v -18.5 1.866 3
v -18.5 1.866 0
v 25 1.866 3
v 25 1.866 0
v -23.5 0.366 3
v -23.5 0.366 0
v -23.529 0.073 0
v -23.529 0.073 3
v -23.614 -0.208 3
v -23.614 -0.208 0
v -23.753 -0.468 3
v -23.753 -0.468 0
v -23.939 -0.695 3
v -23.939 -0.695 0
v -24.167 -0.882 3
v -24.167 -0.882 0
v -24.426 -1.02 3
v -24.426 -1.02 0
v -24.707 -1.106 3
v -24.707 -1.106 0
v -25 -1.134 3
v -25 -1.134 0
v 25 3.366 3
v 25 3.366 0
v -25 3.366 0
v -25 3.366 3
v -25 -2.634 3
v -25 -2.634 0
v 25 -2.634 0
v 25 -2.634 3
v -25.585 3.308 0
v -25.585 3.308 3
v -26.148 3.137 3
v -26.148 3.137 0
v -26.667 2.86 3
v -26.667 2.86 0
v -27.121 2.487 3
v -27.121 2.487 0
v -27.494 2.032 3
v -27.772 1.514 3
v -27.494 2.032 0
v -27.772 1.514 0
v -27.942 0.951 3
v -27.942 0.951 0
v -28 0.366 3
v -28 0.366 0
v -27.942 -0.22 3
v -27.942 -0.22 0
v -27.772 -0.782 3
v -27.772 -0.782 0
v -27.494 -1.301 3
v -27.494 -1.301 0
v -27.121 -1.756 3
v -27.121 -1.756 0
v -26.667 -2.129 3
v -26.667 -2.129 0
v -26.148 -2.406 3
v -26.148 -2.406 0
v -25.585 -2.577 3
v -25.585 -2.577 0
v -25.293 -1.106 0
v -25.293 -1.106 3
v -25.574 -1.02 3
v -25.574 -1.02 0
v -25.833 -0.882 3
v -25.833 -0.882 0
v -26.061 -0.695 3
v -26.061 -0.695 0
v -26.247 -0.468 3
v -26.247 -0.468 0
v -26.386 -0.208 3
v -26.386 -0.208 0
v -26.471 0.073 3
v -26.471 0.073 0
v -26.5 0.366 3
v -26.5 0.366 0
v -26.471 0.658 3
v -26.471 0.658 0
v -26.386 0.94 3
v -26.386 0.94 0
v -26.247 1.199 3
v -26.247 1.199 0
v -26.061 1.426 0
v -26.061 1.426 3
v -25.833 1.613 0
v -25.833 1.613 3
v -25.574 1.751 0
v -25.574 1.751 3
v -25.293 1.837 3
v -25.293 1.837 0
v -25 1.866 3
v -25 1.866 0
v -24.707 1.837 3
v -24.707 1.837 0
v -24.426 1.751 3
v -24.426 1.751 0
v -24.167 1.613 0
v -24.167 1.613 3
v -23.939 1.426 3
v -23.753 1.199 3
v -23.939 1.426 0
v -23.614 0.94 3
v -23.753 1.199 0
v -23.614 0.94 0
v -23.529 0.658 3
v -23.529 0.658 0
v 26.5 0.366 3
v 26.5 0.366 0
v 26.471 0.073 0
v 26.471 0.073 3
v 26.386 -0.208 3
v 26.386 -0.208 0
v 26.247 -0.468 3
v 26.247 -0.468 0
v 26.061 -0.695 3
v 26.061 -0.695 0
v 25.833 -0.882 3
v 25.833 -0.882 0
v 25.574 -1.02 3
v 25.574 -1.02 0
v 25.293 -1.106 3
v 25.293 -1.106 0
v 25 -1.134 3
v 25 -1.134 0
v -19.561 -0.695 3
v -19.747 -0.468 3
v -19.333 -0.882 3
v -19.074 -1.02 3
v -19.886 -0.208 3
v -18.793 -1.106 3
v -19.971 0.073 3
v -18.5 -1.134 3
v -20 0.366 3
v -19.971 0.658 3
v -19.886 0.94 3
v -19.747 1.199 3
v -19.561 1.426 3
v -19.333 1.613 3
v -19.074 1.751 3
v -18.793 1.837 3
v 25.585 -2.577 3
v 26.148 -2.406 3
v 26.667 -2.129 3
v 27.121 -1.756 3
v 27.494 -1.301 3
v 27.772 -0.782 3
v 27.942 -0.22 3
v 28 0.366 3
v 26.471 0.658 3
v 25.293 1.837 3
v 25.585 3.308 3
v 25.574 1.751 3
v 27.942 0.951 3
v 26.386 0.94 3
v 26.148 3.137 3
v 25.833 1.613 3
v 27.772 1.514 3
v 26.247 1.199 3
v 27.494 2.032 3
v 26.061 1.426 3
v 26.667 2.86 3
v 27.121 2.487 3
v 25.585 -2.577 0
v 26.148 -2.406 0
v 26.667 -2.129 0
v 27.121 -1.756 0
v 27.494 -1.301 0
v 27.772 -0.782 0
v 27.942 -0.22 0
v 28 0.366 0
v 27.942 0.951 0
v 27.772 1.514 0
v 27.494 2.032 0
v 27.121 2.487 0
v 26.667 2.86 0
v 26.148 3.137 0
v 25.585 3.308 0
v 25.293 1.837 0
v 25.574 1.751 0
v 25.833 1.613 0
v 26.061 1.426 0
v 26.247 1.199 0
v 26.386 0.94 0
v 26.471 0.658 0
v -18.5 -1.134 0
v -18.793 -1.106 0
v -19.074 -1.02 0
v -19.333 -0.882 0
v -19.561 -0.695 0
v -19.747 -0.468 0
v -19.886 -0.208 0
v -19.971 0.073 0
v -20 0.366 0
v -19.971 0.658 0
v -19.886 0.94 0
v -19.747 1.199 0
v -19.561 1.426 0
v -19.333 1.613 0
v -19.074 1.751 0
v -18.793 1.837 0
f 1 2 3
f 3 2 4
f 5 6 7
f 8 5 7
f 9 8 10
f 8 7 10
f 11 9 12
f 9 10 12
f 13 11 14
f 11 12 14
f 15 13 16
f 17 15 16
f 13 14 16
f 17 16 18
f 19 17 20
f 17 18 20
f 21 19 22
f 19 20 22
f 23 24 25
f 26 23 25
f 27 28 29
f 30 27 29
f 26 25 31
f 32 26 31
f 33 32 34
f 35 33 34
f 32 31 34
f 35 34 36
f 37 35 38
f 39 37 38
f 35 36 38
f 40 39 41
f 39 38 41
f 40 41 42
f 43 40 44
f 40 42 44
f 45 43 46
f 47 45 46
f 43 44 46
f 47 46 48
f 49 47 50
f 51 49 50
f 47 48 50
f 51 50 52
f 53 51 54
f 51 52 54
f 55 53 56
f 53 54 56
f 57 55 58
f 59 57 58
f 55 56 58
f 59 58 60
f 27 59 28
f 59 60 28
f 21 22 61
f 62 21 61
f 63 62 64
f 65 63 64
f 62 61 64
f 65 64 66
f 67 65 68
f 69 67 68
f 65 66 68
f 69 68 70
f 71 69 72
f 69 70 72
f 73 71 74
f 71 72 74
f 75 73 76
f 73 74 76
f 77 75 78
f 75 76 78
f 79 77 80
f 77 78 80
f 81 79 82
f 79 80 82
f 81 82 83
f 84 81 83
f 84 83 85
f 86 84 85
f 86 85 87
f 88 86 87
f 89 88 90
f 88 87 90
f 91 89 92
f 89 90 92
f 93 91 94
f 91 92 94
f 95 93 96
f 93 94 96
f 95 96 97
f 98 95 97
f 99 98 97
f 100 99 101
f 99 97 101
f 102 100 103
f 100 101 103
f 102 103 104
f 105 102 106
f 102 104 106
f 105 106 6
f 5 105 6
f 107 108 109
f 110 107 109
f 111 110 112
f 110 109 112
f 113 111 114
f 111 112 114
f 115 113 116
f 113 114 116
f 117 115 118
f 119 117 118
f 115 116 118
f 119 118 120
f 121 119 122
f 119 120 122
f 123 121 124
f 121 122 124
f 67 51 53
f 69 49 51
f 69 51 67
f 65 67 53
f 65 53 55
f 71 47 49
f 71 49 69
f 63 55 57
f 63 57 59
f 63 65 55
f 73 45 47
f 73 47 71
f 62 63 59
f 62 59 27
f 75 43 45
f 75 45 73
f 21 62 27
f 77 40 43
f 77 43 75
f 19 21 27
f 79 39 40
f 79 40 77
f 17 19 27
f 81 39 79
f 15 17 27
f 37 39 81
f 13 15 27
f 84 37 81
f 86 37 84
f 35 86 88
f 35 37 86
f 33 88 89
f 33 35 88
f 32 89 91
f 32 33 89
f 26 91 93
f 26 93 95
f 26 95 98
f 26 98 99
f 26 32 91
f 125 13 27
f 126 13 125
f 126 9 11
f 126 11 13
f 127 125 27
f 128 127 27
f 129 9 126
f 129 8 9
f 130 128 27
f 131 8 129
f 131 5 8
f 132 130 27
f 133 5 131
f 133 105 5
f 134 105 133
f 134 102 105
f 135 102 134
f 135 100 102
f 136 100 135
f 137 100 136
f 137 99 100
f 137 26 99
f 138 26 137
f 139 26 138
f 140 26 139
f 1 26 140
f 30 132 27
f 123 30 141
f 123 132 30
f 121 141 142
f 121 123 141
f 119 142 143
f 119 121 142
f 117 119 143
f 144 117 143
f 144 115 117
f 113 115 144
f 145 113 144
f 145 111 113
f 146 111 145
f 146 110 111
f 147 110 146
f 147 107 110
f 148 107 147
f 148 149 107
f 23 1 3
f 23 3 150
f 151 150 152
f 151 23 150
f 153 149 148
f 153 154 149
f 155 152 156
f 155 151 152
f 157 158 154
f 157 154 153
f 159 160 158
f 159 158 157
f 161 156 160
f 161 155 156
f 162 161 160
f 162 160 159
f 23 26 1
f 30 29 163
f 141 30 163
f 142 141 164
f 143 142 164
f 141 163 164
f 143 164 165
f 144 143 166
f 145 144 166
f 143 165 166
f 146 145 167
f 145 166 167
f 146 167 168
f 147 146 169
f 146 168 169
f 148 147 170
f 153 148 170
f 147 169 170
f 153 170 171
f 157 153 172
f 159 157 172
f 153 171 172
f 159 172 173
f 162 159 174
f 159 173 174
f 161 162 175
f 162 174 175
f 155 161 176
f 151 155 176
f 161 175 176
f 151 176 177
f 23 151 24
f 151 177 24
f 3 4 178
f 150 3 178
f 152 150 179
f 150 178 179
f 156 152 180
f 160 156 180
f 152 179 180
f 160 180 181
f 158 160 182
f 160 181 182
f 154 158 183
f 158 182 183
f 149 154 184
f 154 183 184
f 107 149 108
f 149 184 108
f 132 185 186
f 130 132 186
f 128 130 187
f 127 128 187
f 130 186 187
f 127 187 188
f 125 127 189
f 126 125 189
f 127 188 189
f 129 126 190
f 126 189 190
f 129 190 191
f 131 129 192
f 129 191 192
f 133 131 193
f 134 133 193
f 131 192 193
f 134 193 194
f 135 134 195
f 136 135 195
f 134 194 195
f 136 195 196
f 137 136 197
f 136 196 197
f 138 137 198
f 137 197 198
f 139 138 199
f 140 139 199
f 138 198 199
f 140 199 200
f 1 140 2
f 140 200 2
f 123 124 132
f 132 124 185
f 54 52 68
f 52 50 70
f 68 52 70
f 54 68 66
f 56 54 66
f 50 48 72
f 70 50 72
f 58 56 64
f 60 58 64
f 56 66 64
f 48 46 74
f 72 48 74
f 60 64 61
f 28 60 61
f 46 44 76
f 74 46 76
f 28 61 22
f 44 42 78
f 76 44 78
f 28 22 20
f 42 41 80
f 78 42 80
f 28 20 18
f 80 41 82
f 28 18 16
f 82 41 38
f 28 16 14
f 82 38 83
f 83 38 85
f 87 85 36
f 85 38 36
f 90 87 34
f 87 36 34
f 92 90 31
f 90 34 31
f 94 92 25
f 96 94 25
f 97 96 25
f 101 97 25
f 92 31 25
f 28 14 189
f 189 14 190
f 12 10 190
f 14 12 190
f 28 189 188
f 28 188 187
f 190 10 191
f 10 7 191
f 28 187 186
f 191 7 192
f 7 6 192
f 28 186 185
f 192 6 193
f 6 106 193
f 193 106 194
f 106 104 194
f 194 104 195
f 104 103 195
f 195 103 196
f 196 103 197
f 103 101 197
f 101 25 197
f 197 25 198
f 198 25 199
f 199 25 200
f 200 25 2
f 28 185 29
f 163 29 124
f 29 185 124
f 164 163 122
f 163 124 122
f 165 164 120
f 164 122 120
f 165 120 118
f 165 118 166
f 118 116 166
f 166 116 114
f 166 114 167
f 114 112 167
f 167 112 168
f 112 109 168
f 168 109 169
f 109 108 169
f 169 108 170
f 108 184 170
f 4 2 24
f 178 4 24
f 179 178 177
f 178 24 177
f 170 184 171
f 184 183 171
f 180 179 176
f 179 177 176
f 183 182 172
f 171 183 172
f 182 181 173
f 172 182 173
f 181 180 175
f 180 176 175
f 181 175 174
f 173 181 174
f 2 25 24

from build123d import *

# Parameters (mm, degrees)
F1_DEPTH = 3


with BuildPart() as f1:
    # F0 (on Top) → F1 (new body)
    with BuildSketch(Plane.XY):
        with BuildLine():
            Line((25, 3.365576), (0, 3.365576))
            Line((0, 3.365576), (-25, 3.365576))
            ThreePointArc((-25, 3.365576), (-22.87868, 2.486897), (-22, 0.365576))
            ThreePointArc((-22, 0.365576), (-22.87868, -1.755744), (-25, -2.634424))
            Line((-25, -2.634424), (0, -2.634424))
            Line((0, -2.634424), (25, -2.634424))
            ThreePointArc((25, -2.634424), (28, 0.365576), (25, 3.365576))
        make_face()
        with BuildLine():
            ThreePointArc((-18.5, -1.134424), (-20, 0.365576), (-18.5, 1.865576))
            Line((-18.5, 1.865576), (25, 1.865576))
            ThreePointArc((25, 1.865576), (26.06066, 1.426237), (26.5, 0.365576))
            ThreePointArc((26.5, 0.365576), (26.06066, -0.695084), (25, -1.134424))
            Line((25, -1.134424), (-18.5, -1.134424))
        make_face(mode=Mode.SUBTRACT)
        with BuildLine():
            ThreePointArc((-22, 0.365576), (-22.87868, 2.486897), (-25, 3.365576))
            ThreePointArc((-25, 3.365576), (-28, 0.365576), (-25, -2.634424))
            ThreePointArc((-25, -2.634424), (-22.87868, -1.755744), (-22, 0.365576))
        make_face()
        with BuildLine():
            ThreePointArc((-23.5, 0.365576), (-23.93934, -0.695084), (-25, -1.134424))
            ThreePointArc((-25, -1.134424), (-26.06066, 1.426237), (-23.5, 0.365576))
        make_face(mode=Mode.SUBTRACT)
    extrude(amount=F1_DEPTH)


solid = f1.part
